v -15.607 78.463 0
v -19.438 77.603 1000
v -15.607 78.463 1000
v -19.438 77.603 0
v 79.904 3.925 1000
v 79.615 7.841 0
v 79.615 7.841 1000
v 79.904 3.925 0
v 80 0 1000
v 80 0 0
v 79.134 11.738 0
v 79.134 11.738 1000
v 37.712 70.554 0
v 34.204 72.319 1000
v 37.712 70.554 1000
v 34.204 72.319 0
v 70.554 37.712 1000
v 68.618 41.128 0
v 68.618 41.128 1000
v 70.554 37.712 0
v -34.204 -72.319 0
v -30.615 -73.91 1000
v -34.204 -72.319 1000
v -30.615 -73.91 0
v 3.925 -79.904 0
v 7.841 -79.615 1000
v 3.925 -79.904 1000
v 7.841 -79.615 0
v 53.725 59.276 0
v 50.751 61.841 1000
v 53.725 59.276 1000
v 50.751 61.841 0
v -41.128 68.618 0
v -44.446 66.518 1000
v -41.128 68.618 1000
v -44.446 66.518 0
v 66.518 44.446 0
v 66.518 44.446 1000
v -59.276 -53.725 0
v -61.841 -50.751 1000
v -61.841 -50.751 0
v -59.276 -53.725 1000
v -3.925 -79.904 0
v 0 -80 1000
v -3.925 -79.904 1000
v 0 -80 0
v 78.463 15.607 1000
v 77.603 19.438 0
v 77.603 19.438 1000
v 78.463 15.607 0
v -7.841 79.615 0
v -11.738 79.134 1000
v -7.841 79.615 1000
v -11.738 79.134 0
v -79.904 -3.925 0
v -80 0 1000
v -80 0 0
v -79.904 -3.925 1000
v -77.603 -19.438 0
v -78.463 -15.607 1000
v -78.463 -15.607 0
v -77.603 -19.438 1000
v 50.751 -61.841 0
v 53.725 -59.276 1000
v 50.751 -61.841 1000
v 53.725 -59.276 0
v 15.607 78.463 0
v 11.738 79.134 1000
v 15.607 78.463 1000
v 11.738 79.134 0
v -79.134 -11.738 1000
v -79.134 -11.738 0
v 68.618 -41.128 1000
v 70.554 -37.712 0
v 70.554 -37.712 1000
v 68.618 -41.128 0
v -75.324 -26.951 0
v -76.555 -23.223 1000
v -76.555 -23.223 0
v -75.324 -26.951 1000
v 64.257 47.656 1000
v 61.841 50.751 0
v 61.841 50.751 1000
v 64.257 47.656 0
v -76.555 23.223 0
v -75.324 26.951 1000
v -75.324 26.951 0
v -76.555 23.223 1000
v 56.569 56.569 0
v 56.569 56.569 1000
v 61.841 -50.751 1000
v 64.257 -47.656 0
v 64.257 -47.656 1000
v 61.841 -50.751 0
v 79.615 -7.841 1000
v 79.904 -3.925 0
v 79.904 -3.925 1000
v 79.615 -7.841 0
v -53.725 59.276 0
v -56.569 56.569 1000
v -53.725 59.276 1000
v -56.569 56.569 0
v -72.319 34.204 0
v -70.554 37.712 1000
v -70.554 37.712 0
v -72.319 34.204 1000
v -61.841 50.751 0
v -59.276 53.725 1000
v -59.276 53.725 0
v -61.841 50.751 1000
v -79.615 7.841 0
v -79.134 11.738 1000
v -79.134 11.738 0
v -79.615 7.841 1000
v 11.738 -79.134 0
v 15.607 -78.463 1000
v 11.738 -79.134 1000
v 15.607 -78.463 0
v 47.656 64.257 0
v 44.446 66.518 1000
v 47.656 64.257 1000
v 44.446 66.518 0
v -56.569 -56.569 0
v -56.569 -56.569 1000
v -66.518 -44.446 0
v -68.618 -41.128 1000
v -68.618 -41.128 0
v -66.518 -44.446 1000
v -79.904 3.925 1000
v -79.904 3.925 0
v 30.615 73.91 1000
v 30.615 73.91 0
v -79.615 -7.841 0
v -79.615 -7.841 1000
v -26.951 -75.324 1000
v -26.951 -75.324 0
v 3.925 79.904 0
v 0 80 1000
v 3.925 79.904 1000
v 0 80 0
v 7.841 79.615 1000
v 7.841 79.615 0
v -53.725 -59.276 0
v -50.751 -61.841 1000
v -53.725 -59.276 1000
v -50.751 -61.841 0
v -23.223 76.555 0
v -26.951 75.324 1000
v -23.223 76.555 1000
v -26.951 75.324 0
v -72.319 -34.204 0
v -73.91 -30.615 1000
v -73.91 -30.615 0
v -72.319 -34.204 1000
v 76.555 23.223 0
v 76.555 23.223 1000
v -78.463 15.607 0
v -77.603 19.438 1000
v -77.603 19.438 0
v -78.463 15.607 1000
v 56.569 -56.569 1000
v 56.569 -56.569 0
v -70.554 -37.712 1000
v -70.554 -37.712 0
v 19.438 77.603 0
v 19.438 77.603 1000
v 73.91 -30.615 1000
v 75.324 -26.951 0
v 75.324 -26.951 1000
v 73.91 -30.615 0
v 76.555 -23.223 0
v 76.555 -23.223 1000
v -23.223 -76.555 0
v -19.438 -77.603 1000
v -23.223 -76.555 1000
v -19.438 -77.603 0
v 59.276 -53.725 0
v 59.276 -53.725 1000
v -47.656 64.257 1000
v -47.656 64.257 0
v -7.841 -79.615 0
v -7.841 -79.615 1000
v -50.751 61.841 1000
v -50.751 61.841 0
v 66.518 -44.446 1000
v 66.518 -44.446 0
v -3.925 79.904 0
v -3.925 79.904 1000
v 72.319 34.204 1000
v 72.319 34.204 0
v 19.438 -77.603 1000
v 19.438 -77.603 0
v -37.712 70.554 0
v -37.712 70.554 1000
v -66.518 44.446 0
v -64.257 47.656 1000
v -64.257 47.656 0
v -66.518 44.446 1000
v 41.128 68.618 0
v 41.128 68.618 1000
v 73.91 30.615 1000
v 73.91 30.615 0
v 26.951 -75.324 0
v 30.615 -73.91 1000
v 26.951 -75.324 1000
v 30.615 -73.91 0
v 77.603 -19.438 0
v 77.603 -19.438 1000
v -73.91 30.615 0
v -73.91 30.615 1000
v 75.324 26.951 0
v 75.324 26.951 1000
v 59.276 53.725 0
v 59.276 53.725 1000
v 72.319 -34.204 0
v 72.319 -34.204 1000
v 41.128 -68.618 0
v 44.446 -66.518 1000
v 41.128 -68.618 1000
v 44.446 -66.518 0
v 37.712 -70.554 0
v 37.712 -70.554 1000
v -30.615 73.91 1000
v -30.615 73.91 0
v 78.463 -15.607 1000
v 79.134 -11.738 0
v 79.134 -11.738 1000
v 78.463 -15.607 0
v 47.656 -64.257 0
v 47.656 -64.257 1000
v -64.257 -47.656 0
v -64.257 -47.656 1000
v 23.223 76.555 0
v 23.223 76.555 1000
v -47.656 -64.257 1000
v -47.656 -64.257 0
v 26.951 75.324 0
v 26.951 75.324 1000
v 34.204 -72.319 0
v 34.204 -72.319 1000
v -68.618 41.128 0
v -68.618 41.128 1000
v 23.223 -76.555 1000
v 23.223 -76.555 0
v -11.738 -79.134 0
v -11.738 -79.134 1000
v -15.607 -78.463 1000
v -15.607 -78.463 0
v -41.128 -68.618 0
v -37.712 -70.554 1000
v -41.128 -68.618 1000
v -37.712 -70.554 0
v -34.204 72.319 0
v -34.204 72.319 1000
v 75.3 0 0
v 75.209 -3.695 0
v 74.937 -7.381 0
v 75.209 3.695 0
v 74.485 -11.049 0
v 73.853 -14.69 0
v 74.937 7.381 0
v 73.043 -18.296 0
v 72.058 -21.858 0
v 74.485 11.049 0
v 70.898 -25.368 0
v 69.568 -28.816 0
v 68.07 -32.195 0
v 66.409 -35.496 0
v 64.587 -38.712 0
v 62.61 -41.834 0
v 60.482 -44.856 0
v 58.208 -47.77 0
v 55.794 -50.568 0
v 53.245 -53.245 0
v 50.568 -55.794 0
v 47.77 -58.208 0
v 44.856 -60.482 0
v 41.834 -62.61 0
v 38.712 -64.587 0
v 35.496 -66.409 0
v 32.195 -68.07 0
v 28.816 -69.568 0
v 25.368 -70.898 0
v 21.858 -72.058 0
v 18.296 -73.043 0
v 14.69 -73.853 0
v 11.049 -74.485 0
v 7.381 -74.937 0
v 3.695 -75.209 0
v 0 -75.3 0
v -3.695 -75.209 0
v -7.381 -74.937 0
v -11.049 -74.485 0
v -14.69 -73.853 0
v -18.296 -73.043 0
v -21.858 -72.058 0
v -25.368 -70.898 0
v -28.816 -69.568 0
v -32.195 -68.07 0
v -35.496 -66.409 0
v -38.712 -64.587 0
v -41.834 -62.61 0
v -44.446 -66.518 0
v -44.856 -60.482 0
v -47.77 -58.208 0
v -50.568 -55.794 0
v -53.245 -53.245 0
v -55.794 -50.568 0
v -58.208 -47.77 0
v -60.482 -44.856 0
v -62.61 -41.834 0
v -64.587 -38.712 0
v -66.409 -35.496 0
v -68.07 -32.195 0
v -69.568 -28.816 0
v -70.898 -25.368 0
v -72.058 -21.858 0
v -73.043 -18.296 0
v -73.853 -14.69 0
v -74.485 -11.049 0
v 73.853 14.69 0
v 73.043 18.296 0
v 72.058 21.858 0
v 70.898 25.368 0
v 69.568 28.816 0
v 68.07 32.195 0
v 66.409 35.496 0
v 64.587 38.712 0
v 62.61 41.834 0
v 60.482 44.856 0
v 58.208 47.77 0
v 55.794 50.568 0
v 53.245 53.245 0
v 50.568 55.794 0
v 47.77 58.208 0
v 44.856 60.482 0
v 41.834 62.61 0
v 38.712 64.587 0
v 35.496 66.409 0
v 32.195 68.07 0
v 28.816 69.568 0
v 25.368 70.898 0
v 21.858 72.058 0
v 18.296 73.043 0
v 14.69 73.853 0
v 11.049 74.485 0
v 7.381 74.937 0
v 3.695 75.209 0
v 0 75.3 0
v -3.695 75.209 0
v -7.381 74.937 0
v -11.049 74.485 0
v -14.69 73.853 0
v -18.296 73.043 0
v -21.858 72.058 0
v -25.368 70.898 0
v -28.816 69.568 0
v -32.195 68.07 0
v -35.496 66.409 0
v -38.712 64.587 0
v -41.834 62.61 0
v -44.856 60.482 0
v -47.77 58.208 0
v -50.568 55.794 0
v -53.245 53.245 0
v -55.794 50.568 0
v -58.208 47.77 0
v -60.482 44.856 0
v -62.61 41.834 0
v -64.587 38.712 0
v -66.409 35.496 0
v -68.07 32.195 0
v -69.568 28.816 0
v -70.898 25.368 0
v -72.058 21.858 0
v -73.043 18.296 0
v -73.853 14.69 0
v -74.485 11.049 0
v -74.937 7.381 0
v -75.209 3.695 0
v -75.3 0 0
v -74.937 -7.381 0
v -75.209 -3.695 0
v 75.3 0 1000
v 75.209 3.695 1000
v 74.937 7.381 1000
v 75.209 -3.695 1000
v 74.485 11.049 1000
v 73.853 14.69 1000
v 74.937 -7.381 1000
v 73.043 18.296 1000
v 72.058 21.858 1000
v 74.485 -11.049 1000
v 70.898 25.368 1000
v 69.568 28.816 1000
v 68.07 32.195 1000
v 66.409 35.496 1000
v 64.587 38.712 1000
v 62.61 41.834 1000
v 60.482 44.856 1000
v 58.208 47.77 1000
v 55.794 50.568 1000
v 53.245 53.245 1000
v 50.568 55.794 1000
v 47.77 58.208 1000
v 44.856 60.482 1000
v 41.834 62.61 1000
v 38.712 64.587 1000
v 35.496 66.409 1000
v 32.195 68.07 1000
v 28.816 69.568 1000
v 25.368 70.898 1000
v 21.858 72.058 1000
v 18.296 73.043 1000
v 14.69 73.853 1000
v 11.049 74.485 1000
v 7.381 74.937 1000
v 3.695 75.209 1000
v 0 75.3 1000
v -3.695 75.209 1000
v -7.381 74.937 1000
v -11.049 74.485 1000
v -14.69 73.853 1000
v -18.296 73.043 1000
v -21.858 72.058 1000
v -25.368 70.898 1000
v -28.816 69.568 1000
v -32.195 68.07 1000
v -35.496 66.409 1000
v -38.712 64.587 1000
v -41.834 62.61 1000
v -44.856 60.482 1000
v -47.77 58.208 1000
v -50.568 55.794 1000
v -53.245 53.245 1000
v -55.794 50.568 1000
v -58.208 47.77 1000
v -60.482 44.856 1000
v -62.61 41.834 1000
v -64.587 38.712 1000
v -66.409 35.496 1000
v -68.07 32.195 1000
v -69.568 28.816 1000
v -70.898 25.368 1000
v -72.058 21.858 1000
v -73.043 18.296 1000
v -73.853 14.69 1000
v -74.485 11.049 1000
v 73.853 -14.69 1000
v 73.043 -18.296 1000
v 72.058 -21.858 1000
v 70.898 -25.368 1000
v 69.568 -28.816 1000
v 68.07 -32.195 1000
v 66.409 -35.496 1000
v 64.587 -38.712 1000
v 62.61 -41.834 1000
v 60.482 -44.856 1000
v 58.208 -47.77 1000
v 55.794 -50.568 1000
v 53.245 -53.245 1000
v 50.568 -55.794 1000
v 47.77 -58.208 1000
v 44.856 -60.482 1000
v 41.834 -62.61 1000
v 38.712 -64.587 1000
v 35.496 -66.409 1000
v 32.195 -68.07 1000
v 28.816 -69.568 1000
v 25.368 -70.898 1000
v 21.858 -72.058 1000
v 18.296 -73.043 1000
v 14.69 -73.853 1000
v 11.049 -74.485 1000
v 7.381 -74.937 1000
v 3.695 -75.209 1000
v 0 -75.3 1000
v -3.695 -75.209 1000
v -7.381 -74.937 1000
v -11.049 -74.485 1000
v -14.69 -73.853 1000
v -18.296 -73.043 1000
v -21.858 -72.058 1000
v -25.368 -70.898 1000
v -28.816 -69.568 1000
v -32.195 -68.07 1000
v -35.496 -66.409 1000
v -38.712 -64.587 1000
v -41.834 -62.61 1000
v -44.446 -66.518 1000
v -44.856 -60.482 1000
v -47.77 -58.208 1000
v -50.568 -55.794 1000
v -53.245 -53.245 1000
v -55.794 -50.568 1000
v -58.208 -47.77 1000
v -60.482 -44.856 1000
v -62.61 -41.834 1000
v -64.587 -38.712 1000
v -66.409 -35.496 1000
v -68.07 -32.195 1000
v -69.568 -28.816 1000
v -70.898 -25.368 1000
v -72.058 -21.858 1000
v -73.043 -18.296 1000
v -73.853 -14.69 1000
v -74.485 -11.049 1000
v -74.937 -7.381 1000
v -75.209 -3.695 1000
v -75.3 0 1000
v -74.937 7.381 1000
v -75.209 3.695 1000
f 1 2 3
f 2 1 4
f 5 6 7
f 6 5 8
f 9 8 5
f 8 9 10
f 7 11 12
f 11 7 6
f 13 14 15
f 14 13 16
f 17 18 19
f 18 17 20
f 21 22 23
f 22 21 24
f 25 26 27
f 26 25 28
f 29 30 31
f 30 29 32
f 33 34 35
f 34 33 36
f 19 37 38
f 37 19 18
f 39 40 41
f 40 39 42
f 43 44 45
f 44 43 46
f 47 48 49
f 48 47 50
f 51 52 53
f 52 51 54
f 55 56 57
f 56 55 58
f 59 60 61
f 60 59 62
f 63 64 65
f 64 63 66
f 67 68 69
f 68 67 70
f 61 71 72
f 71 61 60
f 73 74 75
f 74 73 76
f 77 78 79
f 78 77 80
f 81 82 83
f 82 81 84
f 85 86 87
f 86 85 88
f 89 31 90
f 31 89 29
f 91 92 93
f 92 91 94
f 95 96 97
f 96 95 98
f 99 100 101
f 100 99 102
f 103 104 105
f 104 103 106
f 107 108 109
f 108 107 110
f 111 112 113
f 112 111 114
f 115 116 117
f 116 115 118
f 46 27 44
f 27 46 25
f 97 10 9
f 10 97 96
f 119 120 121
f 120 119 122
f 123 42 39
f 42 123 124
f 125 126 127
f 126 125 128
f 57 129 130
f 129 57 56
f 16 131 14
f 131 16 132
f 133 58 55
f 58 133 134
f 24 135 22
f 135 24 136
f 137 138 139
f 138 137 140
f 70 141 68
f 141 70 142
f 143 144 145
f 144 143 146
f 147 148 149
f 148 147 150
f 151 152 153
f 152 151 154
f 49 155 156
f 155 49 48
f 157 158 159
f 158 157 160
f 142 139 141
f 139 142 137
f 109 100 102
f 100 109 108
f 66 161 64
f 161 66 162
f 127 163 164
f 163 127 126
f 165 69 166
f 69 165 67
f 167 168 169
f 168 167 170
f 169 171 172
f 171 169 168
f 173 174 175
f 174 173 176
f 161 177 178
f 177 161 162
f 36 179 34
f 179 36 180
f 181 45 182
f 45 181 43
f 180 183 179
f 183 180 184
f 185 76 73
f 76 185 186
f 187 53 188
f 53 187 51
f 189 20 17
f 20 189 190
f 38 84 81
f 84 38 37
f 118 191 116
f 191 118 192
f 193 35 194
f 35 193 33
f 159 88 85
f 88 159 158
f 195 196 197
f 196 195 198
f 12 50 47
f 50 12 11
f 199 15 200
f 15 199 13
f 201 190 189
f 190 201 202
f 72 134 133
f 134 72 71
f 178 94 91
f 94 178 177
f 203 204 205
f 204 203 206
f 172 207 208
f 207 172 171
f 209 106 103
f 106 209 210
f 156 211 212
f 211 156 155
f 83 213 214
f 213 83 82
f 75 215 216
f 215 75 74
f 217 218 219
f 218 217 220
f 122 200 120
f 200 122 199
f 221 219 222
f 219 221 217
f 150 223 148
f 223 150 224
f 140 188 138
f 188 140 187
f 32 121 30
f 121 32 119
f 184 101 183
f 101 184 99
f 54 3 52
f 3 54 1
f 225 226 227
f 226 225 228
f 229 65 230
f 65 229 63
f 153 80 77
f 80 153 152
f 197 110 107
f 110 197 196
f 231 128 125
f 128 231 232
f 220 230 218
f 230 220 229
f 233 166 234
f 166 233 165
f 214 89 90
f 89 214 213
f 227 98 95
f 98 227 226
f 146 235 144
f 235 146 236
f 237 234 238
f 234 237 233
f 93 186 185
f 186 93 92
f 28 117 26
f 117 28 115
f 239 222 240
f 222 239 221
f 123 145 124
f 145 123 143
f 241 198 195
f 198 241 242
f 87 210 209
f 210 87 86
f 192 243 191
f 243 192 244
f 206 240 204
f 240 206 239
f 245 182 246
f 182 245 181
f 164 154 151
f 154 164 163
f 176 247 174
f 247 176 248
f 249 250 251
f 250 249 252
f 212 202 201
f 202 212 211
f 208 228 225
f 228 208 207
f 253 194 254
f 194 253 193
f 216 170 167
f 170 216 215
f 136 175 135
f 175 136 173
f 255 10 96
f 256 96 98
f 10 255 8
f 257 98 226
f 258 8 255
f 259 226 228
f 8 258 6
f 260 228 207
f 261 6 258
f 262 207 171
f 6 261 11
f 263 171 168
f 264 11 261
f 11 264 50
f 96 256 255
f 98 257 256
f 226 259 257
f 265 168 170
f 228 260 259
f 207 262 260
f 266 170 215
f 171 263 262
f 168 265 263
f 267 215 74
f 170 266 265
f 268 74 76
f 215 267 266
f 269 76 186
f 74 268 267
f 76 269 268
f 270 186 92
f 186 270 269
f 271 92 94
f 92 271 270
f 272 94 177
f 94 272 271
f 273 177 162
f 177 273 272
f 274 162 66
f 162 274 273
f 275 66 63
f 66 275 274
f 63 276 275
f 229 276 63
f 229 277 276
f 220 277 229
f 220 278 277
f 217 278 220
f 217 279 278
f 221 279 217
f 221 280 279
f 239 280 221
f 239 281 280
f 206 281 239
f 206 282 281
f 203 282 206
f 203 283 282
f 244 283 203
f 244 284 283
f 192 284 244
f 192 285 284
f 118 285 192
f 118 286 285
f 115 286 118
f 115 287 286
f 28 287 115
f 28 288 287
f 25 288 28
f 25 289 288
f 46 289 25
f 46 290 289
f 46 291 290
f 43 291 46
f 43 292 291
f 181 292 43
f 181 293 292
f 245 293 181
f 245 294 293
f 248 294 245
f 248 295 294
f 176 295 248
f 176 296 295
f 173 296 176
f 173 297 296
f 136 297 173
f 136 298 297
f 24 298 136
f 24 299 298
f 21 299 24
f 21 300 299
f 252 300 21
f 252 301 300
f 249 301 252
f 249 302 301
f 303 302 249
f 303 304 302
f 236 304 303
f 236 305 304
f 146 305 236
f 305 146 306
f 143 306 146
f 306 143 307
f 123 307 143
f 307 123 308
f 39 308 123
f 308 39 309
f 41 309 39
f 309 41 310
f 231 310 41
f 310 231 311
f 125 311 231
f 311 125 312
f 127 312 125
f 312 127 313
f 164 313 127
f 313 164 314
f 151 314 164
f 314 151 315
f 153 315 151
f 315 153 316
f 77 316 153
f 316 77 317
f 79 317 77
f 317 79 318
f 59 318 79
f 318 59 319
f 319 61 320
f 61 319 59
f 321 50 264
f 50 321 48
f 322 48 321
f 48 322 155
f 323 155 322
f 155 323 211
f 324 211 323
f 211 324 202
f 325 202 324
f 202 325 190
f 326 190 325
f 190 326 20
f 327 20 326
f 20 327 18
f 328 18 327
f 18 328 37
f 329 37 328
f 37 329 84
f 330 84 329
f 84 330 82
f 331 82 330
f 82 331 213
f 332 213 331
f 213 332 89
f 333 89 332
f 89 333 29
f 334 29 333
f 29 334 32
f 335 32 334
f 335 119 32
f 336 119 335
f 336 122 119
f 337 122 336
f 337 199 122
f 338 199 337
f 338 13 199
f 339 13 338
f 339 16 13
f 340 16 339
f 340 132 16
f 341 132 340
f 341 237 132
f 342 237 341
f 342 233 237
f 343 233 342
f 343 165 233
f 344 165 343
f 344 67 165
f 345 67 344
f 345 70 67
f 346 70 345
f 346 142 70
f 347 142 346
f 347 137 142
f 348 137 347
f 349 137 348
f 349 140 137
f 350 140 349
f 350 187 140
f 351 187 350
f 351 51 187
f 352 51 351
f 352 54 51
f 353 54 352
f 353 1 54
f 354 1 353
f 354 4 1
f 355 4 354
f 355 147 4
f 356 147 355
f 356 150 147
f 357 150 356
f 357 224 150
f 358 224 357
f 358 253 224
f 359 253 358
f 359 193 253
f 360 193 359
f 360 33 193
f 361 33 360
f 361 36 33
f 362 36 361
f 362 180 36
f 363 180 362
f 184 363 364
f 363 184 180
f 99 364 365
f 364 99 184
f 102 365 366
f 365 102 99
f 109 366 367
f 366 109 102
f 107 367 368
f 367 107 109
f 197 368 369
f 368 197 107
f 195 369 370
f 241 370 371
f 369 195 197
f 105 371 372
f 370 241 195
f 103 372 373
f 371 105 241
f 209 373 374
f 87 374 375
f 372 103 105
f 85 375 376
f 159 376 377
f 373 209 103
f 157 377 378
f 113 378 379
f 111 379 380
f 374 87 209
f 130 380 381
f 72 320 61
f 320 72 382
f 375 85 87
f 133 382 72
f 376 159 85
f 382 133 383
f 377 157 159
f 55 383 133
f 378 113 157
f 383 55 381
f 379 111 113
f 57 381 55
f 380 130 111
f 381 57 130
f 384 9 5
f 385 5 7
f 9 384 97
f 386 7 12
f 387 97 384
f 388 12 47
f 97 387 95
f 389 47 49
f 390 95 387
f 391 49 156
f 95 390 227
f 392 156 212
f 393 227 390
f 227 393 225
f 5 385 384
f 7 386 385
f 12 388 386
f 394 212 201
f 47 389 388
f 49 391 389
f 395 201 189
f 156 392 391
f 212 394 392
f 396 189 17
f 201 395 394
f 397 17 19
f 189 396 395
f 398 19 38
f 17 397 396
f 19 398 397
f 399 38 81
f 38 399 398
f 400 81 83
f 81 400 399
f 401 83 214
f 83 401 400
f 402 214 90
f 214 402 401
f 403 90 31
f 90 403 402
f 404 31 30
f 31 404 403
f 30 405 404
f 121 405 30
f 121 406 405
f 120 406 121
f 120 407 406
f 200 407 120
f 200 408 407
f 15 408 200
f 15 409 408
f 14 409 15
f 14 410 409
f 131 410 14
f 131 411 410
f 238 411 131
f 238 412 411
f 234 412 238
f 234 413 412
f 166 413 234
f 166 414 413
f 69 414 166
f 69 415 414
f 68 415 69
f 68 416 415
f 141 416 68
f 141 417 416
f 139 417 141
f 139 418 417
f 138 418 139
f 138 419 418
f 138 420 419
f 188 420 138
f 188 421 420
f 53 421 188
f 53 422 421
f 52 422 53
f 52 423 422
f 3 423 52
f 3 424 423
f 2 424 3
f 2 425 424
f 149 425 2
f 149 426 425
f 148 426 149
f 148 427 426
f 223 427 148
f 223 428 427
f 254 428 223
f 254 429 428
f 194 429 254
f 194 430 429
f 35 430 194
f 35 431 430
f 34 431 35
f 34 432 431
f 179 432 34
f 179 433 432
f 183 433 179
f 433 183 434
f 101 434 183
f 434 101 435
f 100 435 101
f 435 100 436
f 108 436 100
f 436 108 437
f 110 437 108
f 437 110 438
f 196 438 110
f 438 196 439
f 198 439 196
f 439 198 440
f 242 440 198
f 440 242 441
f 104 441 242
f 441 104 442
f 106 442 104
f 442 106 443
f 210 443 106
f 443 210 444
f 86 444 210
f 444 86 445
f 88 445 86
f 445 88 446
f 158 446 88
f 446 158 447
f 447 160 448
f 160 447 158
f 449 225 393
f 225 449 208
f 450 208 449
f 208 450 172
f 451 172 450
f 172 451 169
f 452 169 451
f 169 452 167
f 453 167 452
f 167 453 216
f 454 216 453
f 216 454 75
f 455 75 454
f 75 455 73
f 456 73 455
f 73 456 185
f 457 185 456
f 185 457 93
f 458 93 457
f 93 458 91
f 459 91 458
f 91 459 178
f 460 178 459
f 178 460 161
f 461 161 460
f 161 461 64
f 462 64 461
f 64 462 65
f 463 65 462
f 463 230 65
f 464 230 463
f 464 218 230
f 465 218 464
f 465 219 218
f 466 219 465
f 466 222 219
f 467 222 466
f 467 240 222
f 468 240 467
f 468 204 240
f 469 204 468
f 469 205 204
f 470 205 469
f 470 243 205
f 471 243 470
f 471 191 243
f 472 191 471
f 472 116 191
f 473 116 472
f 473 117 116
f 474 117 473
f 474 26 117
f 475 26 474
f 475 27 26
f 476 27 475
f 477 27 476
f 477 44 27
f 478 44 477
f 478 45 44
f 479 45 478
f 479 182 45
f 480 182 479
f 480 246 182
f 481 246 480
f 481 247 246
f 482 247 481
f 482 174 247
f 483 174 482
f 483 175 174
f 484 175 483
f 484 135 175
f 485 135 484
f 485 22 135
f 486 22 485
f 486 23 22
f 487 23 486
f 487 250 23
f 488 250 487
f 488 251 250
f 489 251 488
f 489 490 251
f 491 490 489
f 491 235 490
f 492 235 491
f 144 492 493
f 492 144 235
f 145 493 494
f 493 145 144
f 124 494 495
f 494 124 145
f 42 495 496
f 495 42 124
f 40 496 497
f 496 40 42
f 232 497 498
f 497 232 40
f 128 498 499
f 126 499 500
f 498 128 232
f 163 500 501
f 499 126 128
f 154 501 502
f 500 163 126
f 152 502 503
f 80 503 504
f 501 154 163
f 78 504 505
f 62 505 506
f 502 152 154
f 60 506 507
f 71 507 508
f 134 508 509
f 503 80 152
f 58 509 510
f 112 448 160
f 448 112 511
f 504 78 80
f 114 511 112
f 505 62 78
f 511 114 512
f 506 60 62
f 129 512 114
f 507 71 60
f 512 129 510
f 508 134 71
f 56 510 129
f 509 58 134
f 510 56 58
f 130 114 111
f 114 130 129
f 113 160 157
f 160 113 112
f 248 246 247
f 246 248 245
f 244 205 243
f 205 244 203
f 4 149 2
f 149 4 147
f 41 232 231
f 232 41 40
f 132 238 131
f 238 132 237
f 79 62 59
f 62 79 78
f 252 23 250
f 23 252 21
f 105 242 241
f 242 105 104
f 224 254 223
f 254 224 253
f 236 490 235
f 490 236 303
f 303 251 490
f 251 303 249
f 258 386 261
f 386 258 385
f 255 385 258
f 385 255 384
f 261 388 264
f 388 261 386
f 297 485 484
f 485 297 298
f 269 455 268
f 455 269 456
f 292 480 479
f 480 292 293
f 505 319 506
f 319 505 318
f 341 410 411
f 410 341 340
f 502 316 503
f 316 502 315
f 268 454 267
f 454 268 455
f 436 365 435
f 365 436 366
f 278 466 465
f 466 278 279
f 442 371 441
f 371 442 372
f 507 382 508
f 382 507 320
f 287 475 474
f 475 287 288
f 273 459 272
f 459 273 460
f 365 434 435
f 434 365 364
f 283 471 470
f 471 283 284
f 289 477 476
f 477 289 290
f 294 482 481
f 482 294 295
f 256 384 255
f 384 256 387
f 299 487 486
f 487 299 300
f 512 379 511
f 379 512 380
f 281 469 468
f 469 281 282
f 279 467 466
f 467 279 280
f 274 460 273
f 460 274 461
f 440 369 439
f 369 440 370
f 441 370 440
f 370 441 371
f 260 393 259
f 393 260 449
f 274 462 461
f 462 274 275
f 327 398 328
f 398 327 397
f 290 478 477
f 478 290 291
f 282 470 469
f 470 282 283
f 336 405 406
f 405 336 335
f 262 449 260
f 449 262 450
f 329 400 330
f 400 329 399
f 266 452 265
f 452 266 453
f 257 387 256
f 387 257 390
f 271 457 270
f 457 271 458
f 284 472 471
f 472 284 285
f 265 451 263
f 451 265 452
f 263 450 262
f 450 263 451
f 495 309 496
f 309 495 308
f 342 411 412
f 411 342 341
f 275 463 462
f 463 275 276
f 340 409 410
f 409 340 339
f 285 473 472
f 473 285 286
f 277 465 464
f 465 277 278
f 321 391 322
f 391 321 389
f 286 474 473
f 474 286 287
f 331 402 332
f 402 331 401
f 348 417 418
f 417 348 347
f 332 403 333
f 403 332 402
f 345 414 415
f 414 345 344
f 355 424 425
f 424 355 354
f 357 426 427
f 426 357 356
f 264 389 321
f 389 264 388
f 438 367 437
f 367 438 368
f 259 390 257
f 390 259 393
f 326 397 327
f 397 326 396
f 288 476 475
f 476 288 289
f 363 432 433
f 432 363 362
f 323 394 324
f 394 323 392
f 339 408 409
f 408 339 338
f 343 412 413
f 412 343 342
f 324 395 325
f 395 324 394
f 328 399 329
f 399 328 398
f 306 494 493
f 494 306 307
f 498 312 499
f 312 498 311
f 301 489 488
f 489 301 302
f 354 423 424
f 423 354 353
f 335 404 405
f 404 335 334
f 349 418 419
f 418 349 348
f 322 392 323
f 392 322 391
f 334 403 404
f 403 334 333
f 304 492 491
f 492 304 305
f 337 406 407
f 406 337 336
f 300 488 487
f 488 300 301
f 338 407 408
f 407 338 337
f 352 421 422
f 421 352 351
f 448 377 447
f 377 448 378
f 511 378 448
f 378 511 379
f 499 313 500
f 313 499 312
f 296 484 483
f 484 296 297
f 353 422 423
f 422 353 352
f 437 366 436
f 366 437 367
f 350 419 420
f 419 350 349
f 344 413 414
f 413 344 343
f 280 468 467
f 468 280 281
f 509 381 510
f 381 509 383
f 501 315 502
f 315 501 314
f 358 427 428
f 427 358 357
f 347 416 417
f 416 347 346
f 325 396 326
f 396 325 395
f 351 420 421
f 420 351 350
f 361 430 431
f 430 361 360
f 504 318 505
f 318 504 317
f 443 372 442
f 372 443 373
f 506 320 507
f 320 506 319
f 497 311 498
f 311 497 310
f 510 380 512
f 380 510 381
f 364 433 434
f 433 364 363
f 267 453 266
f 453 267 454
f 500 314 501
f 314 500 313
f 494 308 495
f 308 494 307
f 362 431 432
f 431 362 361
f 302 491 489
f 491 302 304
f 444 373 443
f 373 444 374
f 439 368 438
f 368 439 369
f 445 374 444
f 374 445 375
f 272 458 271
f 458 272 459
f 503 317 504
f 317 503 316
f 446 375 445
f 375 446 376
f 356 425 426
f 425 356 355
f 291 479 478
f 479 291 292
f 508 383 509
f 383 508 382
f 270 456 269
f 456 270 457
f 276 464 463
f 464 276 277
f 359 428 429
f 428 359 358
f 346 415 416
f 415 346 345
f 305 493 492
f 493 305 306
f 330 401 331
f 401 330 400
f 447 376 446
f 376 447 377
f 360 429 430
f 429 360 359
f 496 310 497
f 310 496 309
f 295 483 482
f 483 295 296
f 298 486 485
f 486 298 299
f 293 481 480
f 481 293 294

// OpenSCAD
$fn = 128;

// HT pipe parameters (mm)
outer_d = 160;
length  = 1000;

// Typical HT pipe wall thickness (approx). Adjust if needed.
wall = 4.7;

inner_d = outer_d - 2*wall;

module ht_pipe(od, id, L) {
    difference() {
        cylinder(h = L, d = od);
        translate([0,0,-0.1]) cylinder(h = L + 0.2, d = id);
    }
}

ht_pipe(outer_d, inner_d, length);
